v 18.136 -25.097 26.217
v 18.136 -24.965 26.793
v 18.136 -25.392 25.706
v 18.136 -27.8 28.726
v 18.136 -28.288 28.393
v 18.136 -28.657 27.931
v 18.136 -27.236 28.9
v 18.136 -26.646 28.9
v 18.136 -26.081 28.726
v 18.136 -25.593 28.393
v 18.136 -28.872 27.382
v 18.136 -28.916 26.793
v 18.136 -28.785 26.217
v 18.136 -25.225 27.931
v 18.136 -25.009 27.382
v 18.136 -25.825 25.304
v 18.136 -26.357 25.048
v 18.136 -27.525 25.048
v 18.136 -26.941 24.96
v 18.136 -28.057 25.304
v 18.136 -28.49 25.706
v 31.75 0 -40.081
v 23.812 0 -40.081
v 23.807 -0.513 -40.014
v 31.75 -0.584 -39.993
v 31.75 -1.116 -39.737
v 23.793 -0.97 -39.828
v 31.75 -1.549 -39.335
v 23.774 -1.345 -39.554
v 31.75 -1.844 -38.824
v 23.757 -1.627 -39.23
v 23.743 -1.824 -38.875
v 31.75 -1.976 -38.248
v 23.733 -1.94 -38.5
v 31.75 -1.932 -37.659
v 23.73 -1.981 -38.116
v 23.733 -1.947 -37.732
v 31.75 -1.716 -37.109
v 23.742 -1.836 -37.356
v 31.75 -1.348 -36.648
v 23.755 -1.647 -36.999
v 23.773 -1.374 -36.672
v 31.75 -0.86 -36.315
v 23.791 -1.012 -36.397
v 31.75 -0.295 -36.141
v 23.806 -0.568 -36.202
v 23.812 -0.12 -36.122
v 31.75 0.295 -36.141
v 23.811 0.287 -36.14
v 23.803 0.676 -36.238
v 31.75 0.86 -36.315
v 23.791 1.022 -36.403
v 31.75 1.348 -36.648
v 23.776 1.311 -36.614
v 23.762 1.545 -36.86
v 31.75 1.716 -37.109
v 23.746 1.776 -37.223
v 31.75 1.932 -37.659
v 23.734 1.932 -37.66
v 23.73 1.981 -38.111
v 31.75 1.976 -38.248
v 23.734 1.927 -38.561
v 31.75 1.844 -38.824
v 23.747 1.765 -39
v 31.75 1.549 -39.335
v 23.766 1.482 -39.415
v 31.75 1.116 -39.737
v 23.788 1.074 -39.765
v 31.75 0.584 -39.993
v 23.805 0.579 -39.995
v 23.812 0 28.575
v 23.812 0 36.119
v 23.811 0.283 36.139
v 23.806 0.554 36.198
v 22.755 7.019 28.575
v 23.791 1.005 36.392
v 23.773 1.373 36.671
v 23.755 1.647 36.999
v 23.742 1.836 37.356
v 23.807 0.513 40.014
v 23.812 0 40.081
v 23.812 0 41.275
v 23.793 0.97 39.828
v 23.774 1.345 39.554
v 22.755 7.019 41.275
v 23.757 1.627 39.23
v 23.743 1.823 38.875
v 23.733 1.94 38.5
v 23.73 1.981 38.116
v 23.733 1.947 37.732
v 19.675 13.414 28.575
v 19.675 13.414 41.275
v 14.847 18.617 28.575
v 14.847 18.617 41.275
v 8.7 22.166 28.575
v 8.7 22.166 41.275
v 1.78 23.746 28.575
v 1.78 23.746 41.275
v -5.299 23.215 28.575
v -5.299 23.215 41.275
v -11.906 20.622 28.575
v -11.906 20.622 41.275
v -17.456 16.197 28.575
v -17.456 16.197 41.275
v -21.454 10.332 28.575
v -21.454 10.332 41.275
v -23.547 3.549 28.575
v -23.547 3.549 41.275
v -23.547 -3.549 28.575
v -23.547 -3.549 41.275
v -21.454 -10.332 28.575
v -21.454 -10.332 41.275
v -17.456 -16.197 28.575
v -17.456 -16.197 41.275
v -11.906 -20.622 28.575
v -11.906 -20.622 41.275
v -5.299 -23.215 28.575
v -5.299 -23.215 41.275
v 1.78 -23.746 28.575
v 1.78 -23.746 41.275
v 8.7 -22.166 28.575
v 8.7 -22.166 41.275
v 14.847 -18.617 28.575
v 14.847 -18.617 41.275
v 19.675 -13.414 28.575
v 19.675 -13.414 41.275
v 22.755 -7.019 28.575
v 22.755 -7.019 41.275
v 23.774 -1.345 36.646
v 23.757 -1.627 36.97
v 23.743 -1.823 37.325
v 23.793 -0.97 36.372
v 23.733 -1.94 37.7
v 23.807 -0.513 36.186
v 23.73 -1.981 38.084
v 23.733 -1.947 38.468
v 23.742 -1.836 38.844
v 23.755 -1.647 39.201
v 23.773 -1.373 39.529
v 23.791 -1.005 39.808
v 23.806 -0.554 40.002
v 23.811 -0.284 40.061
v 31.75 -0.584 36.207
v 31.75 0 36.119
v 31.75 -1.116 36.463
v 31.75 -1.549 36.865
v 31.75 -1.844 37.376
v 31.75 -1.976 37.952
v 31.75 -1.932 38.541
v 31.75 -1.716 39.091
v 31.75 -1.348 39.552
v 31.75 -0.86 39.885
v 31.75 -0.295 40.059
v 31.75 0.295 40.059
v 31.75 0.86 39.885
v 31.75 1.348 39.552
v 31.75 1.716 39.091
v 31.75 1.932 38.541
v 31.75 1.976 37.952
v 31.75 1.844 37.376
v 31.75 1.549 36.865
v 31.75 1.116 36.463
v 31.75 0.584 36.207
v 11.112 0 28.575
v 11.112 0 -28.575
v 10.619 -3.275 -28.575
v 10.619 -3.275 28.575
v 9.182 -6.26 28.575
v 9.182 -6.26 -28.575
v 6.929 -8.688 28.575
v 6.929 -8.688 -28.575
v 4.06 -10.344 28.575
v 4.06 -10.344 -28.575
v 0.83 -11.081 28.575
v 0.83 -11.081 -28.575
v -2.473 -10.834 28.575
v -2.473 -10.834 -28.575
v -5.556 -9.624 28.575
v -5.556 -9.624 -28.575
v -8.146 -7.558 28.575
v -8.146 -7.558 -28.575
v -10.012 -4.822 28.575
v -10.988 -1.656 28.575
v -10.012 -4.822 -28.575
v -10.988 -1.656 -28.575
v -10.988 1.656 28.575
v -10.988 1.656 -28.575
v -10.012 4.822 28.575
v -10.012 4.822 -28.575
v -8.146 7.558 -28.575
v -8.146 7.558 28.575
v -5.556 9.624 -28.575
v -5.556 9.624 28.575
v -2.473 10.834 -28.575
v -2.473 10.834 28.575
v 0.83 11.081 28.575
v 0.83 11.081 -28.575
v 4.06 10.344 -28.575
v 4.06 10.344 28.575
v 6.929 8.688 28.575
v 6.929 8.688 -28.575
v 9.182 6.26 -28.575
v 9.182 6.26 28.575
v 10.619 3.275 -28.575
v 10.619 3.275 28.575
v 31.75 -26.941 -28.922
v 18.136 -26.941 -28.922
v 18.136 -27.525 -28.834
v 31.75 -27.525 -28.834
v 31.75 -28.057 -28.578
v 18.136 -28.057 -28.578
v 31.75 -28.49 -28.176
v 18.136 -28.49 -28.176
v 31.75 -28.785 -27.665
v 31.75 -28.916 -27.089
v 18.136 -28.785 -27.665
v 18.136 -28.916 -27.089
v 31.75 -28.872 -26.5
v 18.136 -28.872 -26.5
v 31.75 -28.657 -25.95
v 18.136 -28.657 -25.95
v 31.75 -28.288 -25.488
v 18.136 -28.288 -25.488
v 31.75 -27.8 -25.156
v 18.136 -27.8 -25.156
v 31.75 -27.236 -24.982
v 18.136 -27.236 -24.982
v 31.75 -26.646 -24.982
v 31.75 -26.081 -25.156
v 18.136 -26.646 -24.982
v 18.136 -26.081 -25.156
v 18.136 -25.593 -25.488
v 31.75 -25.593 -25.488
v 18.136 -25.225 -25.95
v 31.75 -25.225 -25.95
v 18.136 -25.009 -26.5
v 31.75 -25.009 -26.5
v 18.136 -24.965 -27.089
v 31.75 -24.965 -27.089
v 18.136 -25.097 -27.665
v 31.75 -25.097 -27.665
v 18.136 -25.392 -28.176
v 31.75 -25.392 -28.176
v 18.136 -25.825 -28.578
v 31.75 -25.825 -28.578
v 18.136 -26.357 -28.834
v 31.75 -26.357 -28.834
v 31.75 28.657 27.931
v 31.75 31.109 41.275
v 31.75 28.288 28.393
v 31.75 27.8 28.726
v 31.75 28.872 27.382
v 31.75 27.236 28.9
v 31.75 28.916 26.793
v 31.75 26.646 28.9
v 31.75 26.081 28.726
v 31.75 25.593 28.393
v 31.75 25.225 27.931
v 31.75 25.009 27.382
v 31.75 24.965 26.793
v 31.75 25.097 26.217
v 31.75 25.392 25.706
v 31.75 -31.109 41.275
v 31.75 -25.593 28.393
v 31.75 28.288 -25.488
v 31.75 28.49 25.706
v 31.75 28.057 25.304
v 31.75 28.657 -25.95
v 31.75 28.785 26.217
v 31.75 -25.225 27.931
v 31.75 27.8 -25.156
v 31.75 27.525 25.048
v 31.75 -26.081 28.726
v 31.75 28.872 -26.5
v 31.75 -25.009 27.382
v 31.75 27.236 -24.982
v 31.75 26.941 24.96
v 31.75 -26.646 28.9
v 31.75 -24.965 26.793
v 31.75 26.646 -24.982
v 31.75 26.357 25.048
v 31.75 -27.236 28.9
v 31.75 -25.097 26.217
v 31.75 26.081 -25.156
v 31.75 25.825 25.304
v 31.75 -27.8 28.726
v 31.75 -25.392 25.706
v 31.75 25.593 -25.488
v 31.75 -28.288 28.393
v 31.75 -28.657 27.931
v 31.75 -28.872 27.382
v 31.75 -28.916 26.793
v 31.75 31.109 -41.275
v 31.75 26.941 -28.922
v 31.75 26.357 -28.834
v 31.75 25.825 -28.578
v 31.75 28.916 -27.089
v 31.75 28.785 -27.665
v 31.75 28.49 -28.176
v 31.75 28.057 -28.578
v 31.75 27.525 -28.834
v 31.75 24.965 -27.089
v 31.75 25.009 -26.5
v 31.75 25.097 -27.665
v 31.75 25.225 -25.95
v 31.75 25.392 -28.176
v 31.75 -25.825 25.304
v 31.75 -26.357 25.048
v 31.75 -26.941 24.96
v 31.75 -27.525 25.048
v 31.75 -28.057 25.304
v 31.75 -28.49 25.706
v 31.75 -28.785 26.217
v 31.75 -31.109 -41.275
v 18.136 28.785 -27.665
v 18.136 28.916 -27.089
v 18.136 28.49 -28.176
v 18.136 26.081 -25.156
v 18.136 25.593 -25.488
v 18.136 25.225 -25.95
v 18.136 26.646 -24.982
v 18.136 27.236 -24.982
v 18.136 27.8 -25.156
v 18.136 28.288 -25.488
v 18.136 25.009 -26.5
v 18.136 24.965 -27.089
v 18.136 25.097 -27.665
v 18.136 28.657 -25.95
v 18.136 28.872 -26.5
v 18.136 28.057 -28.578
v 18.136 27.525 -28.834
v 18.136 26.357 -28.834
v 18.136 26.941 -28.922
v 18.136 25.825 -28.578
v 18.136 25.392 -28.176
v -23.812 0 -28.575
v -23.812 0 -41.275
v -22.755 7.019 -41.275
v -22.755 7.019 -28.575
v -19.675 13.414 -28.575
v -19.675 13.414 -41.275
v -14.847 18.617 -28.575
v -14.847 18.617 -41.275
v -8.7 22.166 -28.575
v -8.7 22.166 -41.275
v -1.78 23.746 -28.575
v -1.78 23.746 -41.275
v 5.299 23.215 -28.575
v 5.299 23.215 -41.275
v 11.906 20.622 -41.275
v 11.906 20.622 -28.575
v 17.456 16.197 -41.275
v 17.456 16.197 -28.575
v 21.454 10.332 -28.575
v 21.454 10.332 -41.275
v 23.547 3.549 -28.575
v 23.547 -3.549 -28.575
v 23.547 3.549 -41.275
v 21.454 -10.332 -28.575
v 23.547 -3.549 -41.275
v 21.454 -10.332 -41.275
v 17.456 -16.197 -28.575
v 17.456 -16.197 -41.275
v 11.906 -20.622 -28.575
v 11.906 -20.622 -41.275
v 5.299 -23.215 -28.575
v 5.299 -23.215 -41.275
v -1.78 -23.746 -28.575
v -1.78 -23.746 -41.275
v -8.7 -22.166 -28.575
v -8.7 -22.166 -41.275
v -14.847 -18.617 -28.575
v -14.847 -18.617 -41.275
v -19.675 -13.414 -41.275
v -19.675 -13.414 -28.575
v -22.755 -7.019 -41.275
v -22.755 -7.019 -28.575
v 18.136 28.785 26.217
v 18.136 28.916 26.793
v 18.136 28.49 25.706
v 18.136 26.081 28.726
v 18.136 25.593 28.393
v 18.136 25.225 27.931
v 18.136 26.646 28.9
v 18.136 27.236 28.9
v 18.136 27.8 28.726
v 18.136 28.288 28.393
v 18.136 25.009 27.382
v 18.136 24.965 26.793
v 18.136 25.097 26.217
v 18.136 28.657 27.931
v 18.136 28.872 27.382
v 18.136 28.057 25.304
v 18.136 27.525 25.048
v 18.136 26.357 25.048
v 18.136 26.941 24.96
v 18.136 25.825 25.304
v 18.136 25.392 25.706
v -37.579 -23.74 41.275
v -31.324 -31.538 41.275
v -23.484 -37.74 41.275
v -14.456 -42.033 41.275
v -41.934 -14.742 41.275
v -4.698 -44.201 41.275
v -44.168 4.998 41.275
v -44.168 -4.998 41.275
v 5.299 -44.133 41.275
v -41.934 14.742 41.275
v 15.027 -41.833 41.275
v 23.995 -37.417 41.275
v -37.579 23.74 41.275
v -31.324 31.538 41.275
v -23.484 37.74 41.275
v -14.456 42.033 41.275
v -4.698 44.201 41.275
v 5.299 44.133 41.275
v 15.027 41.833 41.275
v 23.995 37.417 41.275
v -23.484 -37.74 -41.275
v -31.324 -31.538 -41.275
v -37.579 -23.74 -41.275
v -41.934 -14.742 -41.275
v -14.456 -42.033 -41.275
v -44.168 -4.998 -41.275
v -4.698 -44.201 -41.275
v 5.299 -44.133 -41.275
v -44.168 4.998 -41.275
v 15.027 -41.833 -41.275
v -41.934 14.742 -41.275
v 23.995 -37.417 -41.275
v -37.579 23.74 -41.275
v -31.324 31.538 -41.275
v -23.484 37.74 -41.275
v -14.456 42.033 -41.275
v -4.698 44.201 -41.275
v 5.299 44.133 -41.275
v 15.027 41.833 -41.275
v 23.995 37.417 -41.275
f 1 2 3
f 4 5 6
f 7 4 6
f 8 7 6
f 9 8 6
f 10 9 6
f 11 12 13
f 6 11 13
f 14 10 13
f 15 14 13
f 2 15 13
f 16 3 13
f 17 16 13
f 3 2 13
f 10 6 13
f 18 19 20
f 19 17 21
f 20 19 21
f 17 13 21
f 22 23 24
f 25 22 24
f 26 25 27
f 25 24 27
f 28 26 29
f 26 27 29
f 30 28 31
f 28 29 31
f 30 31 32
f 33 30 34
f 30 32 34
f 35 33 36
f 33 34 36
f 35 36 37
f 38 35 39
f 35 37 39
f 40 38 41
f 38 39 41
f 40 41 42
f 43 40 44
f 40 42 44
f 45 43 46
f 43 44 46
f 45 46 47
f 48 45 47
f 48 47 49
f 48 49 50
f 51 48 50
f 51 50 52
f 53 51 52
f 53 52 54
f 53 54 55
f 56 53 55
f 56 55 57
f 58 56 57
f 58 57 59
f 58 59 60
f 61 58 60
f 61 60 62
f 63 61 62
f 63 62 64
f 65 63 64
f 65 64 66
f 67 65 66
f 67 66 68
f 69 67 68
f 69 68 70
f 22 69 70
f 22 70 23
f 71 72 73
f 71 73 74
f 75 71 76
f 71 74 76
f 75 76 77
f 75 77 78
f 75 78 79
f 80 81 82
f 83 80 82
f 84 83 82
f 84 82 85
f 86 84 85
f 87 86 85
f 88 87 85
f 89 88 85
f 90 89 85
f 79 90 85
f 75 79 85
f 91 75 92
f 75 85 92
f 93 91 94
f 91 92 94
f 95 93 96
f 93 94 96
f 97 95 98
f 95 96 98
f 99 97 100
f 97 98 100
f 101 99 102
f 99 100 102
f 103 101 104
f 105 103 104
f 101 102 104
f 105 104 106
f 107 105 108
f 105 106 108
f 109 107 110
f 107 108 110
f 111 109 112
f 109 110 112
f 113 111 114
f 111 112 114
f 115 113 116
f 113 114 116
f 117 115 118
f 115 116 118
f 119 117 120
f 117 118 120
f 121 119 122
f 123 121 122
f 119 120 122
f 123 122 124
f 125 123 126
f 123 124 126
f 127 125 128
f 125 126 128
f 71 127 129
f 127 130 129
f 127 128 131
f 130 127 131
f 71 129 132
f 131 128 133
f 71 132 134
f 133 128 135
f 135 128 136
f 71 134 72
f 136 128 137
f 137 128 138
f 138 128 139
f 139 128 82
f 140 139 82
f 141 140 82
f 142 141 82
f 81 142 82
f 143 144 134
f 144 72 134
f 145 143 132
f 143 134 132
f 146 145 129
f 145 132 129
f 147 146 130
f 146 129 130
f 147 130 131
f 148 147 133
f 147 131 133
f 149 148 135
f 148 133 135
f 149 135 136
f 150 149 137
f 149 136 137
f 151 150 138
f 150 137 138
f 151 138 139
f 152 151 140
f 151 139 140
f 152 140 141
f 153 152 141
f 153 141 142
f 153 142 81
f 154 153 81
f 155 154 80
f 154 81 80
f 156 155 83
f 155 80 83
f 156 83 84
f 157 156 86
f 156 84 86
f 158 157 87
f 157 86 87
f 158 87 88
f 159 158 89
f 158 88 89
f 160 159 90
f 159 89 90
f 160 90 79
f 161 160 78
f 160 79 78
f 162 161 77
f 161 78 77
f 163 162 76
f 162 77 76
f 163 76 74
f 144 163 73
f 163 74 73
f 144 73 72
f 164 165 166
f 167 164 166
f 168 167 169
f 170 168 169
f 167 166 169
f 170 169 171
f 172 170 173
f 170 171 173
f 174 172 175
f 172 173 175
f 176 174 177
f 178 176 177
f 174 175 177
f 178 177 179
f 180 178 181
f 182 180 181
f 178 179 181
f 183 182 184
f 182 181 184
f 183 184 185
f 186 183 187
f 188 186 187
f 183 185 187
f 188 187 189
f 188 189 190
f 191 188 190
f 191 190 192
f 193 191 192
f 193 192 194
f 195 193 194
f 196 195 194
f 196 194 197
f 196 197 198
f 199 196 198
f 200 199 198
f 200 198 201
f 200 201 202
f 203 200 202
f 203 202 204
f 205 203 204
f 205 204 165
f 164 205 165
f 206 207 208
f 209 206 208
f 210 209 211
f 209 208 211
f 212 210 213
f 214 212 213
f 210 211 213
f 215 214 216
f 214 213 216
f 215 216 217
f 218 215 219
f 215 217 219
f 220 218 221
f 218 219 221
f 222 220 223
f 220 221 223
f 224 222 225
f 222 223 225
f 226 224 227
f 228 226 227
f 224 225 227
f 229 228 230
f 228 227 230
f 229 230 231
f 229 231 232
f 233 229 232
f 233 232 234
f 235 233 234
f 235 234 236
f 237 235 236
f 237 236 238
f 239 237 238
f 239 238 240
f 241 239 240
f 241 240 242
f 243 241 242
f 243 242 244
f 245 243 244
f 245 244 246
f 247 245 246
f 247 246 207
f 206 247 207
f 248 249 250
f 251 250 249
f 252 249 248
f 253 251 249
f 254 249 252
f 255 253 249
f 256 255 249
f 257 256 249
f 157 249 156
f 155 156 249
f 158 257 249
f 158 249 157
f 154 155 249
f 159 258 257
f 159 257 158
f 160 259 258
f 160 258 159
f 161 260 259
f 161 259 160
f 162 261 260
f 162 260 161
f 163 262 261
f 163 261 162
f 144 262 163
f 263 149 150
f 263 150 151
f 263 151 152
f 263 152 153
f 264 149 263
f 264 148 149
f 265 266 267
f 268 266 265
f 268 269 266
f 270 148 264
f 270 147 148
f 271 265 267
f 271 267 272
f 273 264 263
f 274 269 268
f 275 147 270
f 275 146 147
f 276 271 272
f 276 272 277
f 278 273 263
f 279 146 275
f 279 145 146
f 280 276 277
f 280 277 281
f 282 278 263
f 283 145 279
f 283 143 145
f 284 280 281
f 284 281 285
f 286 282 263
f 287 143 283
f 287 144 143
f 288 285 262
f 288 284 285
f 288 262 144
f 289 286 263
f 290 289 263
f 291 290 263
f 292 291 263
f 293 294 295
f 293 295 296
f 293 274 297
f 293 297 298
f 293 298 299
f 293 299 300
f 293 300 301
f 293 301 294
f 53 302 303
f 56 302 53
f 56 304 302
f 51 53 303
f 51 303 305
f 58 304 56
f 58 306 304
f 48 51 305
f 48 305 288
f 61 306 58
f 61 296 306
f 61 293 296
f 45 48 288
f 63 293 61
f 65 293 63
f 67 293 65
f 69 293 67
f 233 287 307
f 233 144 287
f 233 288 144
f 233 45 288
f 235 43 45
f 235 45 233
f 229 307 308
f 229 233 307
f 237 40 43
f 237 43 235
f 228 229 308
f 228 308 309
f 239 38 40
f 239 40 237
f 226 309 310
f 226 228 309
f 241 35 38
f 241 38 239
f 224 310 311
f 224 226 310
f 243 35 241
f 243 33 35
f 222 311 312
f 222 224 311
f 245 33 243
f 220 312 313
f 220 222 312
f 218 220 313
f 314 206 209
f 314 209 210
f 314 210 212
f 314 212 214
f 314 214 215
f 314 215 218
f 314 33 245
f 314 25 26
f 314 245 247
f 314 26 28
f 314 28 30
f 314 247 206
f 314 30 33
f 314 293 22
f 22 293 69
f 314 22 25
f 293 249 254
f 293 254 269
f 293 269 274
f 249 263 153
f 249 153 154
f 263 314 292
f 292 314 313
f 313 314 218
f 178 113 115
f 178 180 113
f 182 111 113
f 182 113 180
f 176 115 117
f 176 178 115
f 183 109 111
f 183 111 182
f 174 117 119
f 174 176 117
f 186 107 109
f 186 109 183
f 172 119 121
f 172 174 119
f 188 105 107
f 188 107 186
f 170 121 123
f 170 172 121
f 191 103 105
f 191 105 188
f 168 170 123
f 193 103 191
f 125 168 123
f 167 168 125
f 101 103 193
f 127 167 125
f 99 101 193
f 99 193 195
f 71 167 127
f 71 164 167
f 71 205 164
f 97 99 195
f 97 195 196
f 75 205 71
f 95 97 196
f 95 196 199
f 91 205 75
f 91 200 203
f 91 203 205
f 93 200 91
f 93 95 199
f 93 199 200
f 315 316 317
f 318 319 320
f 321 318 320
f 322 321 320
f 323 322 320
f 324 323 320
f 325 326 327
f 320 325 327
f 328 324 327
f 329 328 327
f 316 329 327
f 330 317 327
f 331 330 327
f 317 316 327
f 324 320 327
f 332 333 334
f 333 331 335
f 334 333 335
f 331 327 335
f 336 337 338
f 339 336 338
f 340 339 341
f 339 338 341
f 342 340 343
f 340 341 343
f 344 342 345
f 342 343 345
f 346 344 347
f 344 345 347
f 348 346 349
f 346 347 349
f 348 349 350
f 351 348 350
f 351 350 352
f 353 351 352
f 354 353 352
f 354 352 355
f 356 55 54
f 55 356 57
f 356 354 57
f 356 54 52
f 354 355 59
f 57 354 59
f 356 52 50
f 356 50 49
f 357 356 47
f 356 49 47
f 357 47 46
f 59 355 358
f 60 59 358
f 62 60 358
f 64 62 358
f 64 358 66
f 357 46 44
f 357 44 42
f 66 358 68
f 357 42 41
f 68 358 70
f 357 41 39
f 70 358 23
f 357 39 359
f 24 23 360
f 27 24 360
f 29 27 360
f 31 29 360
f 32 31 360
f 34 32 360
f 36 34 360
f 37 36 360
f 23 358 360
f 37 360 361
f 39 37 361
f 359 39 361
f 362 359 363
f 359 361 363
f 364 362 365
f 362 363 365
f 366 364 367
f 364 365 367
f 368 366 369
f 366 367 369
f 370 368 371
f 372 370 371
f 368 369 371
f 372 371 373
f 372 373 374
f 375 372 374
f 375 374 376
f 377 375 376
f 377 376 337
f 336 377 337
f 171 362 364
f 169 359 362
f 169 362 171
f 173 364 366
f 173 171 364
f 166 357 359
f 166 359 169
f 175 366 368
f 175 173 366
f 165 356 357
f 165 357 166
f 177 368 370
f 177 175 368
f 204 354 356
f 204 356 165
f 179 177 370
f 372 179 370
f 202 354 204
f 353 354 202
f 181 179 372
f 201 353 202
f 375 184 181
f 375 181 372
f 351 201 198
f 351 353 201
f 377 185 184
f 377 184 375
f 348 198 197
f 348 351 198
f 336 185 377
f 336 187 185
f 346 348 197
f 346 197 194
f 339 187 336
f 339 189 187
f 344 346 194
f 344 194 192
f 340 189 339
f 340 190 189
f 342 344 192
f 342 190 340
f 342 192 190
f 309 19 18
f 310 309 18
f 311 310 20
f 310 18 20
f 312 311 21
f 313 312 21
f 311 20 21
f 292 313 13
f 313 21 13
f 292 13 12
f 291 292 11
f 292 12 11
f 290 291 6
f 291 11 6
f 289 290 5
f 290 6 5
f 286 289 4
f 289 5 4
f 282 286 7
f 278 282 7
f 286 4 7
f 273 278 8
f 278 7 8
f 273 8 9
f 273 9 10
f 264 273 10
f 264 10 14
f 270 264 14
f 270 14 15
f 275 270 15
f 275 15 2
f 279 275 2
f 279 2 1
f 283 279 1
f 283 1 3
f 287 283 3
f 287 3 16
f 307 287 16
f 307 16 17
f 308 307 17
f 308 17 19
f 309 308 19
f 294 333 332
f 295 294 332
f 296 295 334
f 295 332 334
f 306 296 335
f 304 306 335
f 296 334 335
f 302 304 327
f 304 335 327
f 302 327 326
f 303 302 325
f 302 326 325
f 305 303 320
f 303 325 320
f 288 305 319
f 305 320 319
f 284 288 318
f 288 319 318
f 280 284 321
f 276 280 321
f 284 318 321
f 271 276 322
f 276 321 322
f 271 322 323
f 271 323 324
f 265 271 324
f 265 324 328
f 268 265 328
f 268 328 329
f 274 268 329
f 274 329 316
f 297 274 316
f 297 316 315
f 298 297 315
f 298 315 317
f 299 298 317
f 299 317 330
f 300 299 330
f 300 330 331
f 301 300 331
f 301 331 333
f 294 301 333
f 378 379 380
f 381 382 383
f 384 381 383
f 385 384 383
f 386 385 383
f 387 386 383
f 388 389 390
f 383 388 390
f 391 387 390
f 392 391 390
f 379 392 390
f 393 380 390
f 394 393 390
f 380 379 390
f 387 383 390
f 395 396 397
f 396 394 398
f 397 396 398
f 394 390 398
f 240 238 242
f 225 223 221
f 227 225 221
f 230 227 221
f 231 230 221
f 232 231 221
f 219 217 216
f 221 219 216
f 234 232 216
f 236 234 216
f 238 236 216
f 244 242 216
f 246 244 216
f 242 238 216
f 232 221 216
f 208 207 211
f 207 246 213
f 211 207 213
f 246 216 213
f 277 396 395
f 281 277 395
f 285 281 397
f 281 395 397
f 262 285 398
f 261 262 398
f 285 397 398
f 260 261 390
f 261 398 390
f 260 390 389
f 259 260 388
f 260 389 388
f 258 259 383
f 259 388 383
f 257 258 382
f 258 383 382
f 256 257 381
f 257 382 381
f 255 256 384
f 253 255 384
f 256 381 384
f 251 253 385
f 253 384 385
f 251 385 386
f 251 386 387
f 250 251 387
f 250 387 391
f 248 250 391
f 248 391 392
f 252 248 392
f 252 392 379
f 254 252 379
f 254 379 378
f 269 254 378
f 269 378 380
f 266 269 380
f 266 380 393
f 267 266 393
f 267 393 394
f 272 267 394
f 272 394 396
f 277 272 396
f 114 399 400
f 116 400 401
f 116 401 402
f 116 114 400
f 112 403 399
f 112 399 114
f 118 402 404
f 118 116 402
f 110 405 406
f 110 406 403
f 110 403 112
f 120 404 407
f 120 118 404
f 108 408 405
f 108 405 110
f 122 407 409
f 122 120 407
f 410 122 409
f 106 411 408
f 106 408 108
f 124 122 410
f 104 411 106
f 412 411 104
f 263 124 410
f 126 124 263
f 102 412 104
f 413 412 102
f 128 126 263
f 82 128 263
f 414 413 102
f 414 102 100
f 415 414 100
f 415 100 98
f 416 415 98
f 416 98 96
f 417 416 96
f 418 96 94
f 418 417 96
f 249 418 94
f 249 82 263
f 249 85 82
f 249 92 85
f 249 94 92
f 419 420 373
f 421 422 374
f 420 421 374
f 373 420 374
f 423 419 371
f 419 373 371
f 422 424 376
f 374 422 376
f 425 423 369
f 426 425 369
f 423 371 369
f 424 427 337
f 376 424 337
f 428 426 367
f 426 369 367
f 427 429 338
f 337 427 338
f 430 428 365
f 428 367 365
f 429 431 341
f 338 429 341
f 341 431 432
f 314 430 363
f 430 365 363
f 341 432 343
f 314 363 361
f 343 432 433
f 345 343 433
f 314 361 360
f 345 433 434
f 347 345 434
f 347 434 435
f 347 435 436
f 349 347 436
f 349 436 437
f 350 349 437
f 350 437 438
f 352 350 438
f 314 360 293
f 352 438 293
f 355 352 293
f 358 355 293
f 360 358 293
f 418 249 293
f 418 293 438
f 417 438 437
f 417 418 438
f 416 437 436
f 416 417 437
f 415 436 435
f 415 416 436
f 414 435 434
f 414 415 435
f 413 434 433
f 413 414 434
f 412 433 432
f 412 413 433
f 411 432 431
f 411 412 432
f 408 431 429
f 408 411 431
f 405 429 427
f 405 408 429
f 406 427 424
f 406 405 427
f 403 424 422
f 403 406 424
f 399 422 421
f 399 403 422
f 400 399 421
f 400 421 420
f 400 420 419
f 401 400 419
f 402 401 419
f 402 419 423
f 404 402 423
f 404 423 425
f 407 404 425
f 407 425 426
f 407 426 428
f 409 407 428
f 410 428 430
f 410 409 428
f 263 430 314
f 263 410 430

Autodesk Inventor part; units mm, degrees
ref_plane "YZ Plane" through (0, 0, 0) normal (1, 0, 0) x (0, 1, 0)
ref_plane "XZ Plane" through (0, 0, 0) normal (0, 1, 0) x (-1, 0, 0)
ref_plane "XY Plane" through (0, 0, 0) normal (0, 0, 1) x (1, 0, 0)
sketch "Sketch1" plane through (0, 0, 0) normal (0, 0, 1) x (1, 0, 0)
  circle A0 centre (0, 0) radius 11.1125
  circle A1 centre (0, 0) radius 57.15 construction
  line L0 (29.571, 44.45) -> (35.921, 44.45) construction
  line L1 (35.921, 44.45) -> (35.921, -44.45) construction
  line L2 (35.921, -44.45) -> (29.571, -44.45) construction
  line L3 (29.571, -44.45) -> (29.571, 44.45) construction
  line L4 (31.75, 47.519) -> (31.75, -47.519)
  arc A2 (31.75, 47.519) -> (31.75, -47.519) centre (0, 0) ccw
  point P0 (29.571, 0)
  point P1 (57.15, 0)
  point P2 (35.921, 0)
  dimension "d0" = 22.225
  dimension "d2" = 114.3
  dimension "d3" = 88.9
  dimension "d4" = 6.35
  dimension "d5" = 35.921
  dimension "d6" = 21.229
  dimension "d7" = 31.75
extrude "Extrusion1" add sketch "Sketch1" along normal mid plane 82.55
sketch "Sketch3" plane through (0, 0, 41.275) normal (0, 0, 1) x (1, 0, 0)
  circle A0 centre (0, 0) radius 11.1125 construction
  arc A1 (31.75, 47.519) -> (31.75, -47.519) centre (0, 0) ccw construction
  line L0 (31.75, 47.519) -> (31.75, -47.519) construction
  circle A2 centre (0, 0) radius 11.1125 construction
  circle A3 centre (0, 0) radius 23.8125
  dimension "d10" = 47.625
extrude "Extrusion2" cut sketch "Sketch3" against normal blind 12.7
sketch "Sketch4" plane through (0, 0, -41.275) normal (0, 0, -1) x (-1, 0, 0)
  circle A0 centre (0, 0) radius 23.8125
  dimension "d13" = 47.625
extrude "Extrusion3" cut sketch "Sketch4" against normal blind 12.7
sketch "Sketch5" plane through (31.75, -47.519, 41.275) normal (1, 0, 0) x (0, 0, -1)
  line L0 (82.55, 95.0381) -> (82.55, 0) construction
  line L1 (82.55, 0) -> (0, 0) construction
  line L2 (0, 0) -> (0, 95.0381) construction
  line L3 (0, 95.0381) -> (82.55, 95.0381) construction
  circle A0 centre (41.275, 47.519) radius 38.1 construction
  point P0 (41.275, 85.619)
  point P1 (14.3342, 74.4598)
  point P2 (3.175, 47.519)
  point P3 (14.3342, 20.5783)
  point P4 (41.275, 9.419)
  point P5 (68.2158, 20.5783)
  point P6 (79.375, 47.519)
  point P7 (68.2158, 74.4598)
  dimension "d16" = 76.2
  dimension "d32" = 360
hole "Hole1" at (31.75, 26.9408, -26.9408) at (31.75, 0, -38.1) at (31.75, 26.9408, 26.9408) at (31.75, 0, 38.1) at (31.75, -26.9408, 26.9408) at (31.75, -26.9408, -26.9408) direction (-1, 0, 0) diameter 3.9624 depth 13.6144 thread size "10-32 UNF" class "2B" standard "ANSI Unified Screw Threads"
pattern_circular "Circular Pattern1" [suppressed]
sketch "Sketch6" plane through (0, 0, 41.275) normal (0, 0, 1) x (1, 0, 0)
  circle A0 centre (0, 0) radius 23.8125 construction
  arc A1 (31.75, 47.519) -> (31.75, -47.519) centre (0, 0) ccw construction
  line L0 (31.75, 47.519) -> (31.75, -47.519) construction
  circle A2 centre (0, 0) radius 44.45
  circle A3 centre (0, 0) radius 57.15
  arc A4 (31.75, 47.519) -> (31.75, -47.519) centre (0, 0) ccw construction
  dimension "d27" = 12.7
extrude "Extrusion4" cut sketch "Sketch6" against normal through all
equation "\"d13\" = d10"
equation "\"d14\" = d11"
equation "\"d11\" = 12.7"
properties part number "EL2-A-004" material "Aluminum 6061"
